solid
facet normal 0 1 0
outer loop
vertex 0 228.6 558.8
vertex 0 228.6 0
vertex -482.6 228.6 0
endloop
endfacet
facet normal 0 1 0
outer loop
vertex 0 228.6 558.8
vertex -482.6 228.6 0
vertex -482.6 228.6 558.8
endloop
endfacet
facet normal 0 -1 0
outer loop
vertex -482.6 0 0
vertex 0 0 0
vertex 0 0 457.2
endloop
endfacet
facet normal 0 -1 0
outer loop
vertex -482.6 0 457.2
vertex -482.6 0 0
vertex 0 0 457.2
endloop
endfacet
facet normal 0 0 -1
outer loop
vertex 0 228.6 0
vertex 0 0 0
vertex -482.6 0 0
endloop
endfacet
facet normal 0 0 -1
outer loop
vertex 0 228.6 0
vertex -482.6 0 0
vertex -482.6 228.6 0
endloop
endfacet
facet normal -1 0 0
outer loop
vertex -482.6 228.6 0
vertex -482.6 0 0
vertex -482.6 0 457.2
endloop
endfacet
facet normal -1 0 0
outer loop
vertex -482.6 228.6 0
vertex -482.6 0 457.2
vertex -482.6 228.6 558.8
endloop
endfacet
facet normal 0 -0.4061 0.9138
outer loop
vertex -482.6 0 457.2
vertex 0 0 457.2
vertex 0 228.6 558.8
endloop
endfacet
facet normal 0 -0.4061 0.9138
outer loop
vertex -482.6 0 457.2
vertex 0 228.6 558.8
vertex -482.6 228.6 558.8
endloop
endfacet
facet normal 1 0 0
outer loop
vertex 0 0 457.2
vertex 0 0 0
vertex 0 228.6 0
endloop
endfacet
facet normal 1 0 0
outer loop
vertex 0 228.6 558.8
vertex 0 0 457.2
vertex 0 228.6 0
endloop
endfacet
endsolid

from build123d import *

# Parameters (mm, degrees)
F0_W     = 228.6
F0_H     = 558.8
F1_DEPTH = 482.6
F2_SIZE2 = 101.59999
F2_SIZE  = 228.59999


# Not quite as in the source:
# - a fillet or chamfer is up to 0.001 mm smaller than in the source, because OpenCascade refuses the exact size


with BuildPart() as f1:
    # F0 (on Right) → F1 (new body)
    with BuildSketch(Plane.YZ):
        with Locations((114.3, 279.4)):
            Rectangle(F0_W, F0_H)
    extrude(amount=-F1_DEPTH)

    # F2 (size 228.6 and 101.6 in the source; OpenCascade refuses exactly that, so slightly less here)
    f2_edges = [f1.edges().sort_by_distance(p)[0] for p in [
        (-241.3, 0, 558.8),
    ]]
    f2_side = f1.faces().sort_by_distance((-241.3, 114.3, 558.8))[0]
    chamfer(f2_edges, length=F2_SIZE, length2=F2_SIZE2, reference=f2_side)


solid = f1.part
